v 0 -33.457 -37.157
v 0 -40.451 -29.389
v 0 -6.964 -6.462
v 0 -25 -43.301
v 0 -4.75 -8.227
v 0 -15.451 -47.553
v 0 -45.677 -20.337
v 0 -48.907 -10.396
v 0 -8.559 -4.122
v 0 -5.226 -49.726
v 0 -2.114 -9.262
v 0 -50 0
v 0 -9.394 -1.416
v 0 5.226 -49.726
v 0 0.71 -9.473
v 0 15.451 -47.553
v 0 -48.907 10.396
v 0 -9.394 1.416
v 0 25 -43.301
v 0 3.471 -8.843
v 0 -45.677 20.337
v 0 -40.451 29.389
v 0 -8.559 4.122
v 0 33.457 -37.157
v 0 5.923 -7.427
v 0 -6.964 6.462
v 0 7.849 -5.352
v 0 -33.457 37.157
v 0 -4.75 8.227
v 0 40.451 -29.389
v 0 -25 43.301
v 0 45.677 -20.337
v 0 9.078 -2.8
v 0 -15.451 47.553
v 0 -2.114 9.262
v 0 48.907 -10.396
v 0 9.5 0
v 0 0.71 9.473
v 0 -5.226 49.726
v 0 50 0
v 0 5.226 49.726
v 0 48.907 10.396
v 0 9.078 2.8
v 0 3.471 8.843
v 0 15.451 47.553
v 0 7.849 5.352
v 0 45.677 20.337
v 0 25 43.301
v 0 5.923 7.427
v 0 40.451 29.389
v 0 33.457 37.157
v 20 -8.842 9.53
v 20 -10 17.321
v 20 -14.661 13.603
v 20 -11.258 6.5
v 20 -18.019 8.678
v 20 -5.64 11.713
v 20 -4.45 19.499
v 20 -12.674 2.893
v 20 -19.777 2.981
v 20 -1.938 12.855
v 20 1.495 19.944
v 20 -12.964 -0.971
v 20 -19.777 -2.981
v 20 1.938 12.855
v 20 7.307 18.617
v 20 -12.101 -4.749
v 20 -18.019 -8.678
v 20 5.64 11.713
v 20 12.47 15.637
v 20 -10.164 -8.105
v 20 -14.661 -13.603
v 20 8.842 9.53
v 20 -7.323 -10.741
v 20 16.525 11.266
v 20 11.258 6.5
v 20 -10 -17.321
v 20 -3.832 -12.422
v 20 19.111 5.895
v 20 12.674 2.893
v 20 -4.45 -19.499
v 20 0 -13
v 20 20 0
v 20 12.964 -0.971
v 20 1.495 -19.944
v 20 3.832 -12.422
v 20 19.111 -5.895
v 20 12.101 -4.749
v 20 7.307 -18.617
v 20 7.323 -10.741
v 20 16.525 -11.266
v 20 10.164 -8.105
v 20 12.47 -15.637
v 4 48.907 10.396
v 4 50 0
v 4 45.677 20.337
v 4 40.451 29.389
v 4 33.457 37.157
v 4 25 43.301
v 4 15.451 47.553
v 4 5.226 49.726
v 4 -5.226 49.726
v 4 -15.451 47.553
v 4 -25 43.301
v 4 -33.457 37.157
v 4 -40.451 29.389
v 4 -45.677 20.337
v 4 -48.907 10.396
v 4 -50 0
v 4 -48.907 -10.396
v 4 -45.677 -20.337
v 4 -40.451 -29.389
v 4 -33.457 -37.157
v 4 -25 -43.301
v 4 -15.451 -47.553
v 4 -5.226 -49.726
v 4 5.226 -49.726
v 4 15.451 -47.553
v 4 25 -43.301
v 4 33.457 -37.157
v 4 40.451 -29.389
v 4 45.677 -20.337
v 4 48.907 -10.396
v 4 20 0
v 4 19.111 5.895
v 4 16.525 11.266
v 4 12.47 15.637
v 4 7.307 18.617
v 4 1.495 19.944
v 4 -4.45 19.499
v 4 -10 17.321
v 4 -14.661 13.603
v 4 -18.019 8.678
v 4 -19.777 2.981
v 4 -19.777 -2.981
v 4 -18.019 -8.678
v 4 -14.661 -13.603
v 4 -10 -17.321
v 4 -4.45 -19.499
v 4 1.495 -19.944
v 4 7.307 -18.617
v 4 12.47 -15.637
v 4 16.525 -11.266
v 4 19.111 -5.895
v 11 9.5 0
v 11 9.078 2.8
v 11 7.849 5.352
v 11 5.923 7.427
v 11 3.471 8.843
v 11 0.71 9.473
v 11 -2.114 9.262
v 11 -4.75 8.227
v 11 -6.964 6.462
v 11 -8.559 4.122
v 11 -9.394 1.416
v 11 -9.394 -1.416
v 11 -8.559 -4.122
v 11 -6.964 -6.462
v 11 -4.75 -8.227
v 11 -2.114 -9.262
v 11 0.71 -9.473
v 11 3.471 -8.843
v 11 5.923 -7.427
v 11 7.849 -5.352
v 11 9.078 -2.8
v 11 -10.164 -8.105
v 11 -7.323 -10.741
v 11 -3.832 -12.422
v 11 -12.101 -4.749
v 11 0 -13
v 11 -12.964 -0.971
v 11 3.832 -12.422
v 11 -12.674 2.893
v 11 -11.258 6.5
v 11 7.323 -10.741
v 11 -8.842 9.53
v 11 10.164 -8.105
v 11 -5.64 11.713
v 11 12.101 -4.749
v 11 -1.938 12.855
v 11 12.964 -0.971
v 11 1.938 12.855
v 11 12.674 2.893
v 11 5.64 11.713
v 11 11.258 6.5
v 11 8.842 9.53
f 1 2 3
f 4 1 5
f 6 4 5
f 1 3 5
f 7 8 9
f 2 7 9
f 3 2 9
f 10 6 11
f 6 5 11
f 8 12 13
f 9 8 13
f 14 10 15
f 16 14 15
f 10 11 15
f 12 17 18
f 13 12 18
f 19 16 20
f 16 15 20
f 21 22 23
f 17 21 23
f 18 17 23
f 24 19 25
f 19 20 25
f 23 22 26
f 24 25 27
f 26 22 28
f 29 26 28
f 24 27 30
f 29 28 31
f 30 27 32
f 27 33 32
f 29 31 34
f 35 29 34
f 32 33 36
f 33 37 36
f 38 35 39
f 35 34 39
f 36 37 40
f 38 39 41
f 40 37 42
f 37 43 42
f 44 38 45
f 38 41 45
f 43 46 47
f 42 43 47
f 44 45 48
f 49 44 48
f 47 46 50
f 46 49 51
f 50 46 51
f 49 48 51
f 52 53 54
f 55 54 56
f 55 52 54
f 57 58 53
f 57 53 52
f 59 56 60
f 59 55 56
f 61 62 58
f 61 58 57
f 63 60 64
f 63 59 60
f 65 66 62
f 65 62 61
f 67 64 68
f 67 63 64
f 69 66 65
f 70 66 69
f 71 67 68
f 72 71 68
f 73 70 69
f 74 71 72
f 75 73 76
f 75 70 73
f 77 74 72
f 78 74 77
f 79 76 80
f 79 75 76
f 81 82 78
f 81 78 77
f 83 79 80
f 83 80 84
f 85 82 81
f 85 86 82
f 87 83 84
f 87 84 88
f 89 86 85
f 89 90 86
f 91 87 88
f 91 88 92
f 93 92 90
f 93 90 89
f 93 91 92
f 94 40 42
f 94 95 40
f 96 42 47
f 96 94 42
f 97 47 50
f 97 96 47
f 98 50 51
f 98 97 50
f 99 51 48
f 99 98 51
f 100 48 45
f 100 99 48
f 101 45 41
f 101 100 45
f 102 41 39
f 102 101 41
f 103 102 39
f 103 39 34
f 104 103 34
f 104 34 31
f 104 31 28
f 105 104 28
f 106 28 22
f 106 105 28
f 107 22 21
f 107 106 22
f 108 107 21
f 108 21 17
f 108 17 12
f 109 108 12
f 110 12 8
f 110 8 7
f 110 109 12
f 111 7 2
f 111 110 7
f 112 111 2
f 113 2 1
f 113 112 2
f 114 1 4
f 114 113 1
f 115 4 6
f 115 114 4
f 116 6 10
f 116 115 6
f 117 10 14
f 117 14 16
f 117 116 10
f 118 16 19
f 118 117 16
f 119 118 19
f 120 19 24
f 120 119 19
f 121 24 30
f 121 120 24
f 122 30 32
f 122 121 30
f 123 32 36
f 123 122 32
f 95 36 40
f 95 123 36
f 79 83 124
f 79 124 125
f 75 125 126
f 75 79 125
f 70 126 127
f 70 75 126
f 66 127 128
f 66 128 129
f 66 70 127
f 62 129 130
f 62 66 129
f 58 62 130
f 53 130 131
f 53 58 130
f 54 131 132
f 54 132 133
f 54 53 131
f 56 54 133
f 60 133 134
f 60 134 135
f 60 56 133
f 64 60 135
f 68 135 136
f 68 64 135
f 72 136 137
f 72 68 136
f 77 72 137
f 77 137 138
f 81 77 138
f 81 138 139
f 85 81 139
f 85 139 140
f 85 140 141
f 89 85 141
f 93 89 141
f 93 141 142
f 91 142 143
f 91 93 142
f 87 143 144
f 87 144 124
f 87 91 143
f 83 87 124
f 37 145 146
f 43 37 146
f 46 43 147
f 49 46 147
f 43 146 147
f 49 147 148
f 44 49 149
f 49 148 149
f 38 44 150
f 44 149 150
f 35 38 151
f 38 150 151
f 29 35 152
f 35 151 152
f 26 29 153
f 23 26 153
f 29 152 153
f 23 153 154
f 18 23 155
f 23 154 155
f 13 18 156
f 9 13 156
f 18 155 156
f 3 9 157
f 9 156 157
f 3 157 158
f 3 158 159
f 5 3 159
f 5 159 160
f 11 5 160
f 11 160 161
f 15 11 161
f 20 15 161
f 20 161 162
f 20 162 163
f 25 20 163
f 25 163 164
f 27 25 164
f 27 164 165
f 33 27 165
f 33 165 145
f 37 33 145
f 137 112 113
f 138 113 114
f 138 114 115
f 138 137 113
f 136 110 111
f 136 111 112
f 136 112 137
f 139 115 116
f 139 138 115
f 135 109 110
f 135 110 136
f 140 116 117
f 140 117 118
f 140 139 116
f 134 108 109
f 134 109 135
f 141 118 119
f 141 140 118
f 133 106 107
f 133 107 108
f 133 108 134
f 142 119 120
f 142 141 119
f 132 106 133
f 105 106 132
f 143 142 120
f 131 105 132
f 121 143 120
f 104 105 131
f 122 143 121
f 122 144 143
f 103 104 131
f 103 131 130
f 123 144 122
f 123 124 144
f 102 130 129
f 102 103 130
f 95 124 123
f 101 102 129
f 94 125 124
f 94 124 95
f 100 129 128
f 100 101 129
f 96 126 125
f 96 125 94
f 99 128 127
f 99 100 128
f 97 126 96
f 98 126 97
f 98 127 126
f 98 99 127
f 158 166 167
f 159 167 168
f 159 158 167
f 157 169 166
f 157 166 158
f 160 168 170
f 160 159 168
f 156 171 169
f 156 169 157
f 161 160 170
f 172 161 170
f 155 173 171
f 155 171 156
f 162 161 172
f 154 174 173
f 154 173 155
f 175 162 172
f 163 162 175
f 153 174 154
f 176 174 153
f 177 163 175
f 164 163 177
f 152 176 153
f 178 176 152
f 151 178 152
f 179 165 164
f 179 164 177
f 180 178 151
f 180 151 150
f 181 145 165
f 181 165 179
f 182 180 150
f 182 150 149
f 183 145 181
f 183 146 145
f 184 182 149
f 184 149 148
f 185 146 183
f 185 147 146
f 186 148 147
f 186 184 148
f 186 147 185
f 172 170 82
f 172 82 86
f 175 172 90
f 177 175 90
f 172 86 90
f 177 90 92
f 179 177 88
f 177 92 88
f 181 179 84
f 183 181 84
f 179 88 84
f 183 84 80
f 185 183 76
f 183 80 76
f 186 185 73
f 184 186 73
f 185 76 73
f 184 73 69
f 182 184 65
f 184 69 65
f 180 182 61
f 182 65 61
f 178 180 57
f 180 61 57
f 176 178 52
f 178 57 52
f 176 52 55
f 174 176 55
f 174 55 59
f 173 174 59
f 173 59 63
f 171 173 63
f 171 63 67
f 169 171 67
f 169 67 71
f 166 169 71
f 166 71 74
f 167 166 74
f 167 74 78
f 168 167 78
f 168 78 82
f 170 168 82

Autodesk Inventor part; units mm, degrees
ref_plane "YZ Plane" through (0, 0, 0) normal (1, 0, 0) x (0, 1, 0)
ref_plane "XZ Plane" through (0, 0, 0) normal (0, 1, 0) x (-1, 0, 0)
ref_plane "XY Plane" through (0, 0, 0) normal (0, 0, 1) x (1, 0, 0)
sketch "Boceto1" plane through (0, 0, 0) normal (0, 0, 1) x (1, 0, 0)
  line L0 (0, 0) -> (24.2042, 0) construction
  line L1 (0, 9.5) -> (11, 9.5)
  line L2 (0, 9.5) -> (0, 50)
  line L3 (0, 50) -> (4, 50)
  line L4 (4, 50) -> (4, 20)
  line L5 (4, 20) -> (20, 20)
  line L6 (20, 20) -> (20, 13.925)
  line L7 (20, 13.925) -> (11, 13.925)
  line L8 (11, 13.925) -> (11, 9.5)
  line L9 (0, 0) -> (0, 63.5344) construction
  line L10 (10.3397, 15) -> (10.3397, 20) construction
  line L11 (10.3397, 20) -> (20, 20) construction
  dimension "d0" = 50
  dimension "d1" = 4
  dimension "d4" = 13.925
  dimension "d10" = 9.5
  dimension "d11" = 9
  dimension "d13" = 20
  dimension "d15" = 20
revolve "Revolución1" add sketch "Boceto1" angle 360 about axis through (0, 0, 0) along (1, 0, 0)
sketch "Sketch2" plane through (20, 0, 0) normal (1, 0, 0) x (0, 0, -1)
  circle A0 centre (0, 0) radius 13
  circle A1 centre (0, 0) radius 13.925 projected
  dimension "d16" = 26
extrude "Extrusion1" add sketch "Sketch2" against normal up to surface (9 mm away)
properties part number "Reel1ACABARMEDIDAS"
